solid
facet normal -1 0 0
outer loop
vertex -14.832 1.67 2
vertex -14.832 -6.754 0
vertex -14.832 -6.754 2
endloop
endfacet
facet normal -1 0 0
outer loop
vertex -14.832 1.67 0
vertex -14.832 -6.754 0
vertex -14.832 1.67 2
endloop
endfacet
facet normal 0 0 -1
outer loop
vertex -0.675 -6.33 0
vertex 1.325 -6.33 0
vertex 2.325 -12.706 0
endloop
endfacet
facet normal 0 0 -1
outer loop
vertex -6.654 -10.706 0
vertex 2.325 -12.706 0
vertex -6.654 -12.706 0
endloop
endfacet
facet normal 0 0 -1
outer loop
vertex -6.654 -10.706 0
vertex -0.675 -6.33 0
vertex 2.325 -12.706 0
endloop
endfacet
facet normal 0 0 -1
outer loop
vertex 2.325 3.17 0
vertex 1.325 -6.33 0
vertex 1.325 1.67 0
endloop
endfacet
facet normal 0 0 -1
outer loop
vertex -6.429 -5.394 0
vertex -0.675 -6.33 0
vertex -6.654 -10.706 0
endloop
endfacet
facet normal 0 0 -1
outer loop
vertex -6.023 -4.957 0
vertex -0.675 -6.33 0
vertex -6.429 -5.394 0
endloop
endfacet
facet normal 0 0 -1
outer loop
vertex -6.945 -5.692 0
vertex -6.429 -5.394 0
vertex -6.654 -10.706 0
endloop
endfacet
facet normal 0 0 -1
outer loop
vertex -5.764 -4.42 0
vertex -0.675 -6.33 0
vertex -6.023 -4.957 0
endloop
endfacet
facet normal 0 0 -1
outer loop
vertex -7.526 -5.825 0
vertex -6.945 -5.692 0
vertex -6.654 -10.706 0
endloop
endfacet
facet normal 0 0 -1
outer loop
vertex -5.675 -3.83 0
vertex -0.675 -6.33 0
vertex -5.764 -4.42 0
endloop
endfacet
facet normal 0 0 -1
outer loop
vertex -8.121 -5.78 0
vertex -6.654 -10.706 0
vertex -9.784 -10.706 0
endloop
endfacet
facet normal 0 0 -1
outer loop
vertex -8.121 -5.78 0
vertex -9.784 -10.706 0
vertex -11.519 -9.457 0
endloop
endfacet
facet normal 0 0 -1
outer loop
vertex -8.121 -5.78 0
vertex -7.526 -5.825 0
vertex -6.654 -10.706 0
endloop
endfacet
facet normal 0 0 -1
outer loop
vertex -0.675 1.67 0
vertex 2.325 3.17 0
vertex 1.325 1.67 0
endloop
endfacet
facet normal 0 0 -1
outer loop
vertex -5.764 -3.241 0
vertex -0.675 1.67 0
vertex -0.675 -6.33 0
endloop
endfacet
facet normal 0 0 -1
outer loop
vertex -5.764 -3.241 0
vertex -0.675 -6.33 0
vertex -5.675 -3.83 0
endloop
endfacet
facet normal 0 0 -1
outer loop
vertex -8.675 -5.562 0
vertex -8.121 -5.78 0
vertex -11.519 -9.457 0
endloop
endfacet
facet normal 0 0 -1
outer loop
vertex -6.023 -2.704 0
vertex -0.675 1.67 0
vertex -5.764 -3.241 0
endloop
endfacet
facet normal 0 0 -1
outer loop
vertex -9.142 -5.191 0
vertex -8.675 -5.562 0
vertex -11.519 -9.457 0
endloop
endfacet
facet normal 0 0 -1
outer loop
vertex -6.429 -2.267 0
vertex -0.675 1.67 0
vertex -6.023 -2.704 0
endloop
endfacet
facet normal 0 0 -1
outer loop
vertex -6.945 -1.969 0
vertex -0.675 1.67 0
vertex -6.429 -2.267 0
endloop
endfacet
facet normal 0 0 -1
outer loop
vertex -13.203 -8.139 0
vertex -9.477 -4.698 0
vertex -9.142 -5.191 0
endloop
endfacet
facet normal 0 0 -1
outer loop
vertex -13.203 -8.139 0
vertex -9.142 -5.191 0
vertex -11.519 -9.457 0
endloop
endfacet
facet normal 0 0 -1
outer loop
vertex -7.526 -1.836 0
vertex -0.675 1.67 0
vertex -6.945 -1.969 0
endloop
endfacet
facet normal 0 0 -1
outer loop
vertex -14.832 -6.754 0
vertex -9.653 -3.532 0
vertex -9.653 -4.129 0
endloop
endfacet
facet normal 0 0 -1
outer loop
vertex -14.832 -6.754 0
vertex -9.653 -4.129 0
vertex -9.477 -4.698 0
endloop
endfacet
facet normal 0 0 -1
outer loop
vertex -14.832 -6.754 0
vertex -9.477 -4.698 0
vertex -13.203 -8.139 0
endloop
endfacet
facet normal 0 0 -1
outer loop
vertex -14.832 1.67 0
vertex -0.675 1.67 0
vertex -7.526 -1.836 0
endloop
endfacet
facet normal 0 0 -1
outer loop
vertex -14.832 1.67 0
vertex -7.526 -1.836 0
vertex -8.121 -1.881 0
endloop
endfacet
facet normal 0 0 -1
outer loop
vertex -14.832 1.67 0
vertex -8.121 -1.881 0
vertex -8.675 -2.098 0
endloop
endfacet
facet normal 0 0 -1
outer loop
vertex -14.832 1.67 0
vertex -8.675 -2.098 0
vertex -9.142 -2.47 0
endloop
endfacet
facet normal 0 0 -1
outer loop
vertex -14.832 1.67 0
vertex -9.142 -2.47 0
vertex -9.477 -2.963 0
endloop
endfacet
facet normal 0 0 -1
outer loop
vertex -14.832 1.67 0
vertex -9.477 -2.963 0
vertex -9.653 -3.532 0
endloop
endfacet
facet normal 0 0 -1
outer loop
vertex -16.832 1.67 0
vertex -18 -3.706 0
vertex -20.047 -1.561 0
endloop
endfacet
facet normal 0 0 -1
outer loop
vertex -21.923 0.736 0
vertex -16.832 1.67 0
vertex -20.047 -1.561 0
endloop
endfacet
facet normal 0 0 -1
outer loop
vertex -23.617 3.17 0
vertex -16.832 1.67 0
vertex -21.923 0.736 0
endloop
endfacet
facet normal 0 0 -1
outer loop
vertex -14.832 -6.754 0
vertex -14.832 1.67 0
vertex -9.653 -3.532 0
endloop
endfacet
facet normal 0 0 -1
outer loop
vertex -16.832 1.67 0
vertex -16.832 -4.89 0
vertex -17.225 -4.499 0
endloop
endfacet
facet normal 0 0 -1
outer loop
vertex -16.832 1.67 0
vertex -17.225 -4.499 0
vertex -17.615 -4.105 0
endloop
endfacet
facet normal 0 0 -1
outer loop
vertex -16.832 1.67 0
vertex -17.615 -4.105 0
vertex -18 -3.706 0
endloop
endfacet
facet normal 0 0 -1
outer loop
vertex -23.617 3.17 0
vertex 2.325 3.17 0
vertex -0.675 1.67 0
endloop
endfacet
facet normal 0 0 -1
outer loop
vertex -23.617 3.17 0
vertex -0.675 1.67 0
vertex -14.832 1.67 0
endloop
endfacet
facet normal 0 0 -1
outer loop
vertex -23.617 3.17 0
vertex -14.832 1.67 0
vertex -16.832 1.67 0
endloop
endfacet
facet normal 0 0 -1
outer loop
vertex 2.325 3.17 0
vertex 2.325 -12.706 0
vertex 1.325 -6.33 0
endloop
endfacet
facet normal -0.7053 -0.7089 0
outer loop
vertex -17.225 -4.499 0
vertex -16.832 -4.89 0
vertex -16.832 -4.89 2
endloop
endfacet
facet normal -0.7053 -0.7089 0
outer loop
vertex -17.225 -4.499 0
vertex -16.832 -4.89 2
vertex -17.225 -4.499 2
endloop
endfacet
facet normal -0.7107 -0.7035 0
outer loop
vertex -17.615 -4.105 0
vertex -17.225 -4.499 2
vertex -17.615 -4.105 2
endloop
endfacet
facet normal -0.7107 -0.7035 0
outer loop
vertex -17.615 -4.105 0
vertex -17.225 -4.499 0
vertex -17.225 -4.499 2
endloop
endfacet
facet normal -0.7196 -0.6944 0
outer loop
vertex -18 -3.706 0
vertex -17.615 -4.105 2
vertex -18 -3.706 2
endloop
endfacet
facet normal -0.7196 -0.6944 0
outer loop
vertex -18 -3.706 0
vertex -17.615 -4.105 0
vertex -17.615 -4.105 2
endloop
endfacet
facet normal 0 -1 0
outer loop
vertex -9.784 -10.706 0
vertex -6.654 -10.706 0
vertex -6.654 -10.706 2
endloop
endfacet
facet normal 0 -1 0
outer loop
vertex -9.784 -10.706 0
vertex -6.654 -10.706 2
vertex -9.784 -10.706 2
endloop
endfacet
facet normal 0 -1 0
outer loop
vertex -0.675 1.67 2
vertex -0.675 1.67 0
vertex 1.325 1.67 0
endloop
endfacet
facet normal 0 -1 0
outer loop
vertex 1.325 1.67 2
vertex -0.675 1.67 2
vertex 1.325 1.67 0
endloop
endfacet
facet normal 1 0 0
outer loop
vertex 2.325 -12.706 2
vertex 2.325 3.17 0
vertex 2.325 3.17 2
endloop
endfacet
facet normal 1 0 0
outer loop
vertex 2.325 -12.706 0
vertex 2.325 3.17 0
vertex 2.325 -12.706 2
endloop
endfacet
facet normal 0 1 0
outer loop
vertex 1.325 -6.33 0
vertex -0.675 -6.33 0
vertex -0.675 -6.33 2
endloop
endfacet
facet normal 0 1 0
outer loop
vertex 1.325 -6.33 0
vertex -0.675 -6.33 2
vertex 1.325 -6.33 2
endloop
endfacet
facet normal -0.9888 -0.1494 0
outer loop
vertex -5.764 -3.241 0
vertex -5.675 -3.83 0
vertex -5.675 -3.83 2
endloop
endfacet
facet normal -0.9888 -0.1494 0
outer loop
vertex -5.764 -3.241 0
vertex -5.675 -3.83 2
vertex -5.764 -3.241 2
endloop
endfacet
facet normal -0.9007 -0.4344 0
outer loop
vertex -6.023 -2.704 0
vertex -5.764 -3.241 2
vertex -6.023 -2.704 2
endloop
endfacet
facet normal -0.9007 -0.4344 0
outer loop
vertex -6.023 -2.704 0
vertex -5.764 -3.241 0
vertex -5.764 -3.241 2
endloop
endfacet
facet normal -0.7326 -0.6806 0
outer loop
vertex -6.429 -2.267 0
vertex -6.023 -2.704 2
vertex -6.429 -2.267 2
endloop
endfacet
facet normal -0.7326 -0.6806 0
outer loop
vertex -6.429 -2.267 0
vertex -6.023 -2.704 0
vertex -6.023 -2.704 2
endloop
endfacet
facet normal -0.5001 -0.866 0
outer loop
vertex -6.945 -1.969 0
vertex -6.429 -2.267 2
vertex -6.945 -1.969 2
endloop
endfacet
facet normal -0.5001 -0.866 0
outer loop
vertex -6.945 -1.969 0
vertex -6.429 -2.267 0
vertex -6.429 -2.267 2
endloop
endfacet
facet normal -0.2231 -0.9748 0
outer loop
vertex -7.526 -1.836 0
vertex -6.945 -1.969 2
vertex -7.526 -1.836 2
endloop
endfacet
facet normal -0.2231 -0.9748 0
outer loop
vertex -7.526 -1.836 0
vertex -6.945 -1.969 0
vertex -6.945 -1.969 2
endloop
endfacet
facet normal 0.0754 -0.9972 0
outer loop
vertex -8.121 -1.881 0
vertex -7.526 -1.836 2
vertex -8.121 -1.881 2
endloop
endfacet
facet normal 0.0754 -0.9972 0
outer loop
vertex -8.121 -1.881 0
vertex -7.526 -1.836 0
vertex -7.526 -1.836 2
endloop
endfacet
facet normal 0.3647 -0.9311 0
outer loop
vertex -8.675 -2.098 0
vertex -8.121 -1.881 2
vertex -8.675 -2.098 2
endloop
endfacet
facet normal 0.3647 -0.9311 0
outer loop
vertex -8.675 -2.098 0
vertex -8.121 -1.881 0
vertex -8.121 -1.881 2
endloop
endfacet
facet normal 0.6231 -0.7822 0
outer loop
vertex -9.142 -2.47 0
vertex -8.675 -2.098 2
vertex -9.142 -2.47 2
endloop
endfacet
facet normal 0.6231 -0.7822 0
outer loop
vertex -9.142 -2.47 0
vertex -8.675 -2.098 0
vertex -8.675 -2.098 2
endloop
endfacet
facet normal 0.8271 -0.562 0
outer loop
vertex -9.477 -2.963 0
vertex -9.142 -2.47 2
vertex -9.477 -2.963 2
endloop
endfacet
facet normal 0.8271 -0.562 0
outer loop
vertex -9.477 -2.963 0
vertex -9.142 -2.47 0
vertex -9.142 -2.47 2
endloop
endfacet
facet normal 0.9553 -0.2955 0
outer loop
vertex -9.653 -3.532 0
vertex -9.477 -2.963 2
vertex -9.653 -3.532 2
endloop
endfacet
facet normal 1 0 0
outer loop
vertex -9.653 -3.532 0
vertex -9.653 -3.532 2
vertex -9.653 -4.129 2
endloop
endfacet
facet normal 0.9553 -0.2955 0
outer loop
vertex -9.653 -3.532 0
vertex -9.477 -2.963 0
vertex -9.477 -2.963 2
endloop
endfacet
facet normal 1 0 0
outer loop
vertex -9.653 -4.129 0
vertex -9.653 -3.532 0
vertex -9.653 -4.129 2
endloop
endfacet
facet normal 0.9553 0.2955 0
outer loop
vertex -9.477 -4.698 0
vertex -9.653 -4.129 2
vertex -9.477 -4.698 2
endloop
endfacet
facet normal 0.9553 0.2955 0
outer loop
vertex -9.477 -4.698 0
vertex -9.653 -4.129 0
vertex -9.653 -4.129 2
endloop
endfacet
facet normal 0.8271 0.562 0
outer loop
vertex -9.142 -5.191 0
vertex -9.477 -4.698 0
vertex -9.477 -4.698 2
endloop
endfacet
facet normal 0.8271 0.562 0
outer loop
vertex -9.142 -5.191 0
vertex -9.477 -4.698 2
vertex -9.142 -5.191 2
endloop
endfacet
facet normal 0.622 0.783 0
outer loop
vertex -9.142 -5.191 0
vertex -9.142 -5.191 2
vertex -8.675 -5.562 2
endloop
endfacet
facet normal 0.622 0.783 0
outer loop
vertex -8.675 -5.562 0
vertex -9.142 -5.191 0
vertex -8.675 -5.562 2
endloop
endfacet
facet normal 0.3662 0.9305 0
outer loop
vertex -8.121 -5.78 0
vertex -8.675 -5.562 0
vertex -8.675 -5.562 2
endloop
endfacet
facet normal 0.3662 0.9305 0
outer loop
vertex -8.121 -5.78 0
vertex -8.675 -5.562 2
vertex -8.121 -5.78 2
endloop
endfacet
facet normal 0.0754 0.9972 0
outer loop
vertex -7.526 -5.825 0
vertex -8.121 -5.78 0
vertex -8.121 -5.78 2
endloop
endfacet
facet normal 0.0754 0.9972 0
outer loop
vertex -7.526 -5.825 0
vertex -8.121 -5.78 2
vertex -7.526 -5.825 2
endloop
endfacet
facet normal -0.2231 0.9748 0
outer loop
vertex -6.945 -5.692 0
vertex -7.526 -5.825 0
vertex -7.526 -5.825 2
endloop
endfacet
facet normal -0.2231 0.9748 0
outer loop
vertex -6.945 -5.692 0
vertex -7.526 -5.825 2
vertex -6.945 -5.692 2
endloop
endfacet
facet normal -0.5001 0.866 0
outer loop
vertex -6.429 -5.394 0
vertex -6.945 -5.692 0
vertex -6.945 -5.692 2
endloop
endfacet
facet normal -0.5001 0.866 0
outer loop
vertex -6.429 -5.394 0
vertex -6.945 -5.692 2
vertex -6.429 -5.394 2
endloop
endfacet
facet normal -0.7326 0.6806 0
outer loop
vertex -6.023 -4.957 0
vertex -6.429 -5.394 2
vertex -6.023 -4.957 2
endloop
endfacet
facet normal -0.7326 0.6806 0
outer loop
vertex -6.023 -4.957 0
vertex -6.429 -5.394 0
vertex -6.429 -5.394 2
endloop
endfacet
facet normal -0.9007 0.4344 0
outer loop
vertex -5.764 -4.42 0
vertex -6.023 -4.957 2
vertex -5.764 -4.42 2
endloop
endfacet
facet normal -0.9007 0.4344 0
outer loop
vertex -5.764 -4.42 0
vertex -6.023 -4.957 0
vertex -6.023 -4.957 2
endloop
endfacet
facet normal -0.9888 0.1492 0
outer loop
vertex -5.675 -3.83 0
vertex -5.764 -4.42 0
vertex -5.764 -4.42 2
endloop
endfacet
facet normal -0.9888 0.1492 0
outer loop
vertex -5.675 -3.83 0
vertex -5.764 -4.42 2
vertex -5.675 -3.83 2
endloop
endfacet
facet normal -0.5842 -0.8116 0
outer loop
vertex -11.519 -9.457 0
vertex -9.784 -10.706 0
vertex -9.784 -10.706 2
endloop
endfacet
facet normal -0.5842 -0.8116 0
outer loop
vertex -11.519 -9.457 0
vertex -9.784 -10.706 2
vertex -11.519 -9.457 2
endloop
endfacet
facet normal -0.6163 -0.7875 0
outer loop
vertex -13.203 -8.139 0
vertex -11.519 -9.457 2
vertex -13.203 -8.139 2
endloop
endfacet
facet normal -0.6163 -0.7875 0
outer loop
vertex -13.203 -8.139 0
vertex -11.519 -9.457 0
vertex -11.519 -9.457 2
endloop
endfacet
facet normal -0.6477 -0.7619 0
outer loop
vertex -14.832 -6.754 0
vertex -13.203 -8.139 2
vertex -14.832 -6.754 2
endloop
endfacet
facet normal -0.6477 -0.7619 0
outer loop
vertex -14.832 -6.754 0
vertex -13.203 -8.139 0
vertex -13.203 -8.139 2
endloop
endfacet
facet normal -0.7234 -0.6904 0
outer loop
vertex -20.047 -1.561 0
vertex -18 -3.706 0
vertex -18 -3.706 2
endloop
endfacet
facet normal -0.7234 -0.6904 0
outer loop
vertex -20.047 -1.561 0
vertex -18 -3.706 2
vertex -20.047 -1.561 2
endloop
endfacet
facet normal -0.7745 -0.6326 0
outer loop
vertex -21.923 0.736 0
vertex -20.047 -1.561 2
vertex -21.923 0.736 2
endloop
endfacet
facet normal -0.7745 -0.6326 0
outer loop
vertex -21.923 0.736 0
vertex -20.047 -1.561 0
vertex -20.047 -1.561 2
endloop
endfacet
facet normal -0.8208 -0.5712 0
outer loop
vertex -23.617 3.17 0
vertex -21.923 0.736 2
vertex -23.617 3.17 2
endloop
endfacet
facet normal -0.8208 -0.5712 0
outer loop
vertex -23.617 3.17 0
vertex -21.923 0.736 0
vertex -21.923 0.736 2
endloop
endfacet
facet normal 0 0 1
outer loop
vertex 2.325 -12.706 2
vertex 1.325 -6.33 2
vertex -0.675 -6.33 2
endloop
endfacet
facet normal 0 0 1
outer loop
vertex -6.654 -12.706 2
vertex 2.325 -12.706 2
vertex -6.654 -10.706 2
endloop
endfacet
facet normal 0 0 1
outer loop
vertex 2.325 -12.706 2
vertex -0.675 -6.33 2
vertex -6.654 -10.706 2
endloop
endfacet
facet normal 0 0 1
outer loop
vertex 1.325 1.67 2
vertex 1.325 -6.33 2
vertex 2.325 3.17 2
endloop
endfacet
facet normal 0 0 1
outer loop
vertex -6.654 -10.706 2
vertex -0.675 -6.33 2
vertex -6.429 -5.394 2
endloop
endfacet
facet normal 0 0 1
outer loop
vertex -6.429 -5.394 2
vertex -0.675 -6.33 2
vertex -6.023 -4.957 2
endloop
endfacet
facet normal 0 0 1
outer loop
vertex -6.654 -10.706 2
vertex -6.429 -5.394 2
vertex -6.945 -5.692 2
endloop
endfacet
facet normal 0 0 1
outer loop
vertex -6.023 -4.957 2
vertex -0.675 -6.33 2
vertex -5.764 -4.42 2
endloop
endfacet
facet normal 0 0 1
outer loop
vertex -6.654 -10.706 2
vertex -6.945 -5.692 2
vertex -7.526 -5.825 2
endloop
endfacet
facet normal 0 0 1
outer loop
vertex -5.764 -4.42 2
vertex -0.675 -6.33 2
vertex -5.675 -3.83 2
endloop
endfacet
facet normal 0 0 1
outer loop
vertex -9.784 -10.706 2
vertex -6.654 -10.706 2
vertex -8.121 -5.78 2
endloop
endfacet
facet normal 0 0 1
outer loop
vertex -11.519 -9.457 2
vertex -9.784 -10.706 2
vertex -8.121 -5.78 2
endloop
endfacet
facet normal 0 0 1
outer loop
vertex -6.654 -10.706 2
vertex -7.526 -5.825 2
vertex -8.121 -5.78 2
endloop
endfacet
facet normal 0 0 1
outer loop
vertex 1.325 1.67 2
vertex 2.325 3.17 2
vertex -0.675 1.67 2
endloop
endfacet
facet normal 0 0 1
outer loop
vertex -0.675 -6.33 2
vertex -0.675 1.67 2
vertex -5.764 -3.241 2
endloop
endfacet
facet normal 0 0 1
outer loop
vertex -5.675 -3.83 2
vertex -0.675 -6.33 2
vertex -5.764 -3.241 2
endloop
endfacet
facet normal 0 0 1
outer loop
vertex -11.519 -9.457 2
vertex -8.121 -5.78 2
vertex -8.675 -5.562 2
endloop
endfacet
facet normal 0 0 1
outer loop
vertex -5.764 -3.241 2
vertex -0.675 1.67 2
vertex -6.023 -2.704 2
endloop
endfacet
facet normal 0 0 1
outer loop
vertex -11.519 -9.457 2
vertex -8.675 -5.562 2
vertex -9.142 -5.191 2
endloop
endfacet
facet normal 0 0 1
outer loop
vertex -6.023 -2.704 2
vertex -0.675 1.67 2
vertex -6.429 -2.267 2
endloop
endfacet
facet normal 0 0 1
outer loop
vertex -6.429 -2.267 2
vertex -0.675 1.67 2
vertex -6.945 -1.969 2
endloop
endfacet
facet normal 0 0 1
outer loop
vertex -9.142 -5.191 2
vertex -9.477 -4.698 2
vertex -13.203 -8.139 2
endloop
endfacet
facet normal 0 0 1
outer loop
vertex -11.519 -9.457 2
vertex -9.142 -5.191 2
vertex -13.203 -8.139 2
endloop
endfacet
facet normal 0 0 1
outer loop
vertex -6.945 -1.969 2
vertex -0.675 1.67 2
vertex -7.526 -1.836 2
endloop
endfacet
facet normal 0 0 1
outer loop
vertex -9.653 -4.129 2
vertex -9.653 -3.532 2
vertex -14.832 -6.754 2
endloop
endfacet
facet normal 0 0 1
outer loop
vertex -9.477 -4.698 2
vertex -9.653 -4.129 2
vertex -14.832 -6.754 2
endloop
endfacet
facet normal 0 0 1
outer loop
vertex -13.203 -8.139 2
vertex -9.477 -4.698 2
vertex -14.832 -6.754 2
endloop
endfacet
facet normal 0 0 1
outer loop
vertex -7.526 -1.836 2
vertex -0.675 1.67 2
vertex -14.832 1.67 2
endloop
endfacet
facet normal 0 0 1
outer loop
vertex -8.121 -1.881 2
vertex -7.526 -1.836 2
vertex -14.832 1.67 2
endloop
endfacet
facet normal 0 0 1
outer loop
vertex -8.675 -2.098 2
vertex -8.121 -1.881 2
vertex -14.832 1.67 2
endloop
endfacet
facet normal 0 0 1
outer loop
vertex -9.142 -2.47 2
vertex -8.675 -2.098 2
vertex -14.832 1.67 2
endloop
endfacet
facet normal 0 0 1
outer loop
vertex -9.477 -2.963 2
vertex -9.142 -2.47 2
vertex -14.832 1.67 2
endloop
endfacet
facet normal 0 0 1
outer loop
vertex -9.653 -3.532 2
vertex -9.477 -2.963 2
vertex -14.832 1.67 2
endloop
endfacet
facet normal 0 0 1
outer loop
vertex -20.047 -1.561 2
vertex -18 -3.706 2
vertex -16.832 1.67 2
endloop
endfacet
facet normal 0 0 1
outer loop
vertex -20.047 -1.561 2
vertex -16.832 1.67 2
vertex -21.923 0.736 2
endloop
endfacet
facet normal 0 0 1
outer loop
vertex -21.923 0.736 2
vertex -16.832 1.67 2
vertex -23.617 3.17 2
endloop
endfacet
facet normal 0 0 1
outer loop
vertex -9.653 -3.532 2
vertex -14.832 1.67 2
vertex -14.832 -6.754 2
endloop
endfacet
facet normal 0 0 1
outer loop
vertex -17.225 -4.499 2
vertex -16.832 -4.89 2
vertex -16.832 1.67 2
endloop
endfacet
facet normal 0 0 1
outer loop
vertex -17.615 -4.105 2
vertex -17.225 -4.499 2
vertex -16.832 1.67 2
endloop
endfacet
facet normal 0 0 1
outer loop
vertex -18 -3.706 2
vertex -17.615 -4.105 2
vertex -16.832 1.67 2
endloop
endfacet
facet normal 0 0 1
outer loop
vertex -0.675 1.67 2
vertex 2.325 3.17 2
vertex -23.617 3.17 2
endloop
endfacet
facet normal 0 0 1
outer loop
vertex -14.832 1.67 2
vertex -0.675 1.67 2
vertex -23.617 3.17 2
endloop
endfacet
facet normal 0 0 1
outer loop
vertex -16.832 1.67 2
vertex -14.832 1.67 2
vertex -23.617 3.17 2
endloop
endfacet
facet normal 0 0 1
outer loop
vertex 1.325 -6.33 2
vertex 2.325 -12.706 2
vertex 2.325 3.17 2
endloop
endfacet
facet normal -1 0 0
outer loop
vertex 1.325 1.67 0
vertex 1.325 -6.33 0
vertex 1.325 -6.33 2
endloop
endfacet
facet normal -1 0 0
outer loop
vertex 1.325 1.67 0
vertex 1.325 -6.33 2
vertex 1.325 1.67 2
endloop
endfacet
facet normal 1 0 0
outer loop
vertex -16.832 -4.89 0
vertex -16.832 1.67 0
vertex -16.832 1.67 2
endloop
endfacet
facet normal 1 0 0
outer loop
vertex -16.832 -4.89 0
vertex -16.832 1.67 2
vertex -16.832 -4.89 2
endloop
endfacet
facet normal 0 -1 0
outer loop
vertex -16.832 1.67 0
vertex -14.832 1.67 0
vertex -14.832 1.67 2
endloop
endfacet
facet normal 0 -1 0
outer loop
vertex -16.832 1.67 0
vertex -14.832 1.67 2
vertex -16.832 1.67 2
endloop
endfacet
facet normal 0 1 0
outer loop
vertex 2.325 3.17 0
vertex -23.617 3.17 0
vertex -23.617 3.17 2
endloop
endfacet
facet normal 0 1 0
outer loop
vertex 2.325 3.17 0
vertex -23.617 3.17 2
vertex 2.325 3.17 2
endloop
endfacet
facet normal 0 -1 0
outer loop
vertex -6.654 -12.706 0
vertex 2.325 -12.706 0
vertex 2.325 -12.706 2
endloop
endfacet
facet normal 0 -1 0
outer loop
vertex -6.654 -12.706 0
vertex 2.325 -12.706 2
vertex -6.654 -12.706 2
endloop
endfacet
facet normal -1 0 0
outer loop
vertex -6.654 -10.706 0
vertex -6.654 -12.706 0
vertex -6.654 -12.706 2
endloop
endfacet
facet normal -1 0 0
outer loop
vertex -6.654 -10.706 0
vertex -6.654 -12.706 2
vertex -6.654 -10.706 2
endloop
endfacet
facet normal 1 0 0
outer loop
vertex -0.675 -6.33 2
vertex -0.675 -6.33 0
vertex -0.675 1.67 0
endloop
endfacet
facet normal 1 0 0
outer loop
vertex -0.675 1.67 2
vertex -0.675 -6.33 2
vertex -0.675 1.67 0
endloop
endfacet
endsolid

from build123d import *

# Parameters (mm, degrees)
SKETCH1_R           = 2
SKETCH1_W           = 2
SKETCH1_H           = 8
BOSS_EXTRUDE1_DEPTH = 2


with BuildPart() as part:
    # Sketch1 → Boss-Extrude1 (new body)
    with BuildSketch(Plane.XY):
        with BuildLine():
            Line((-6.654132998, -12.706050279), (-6.654132998, -10.706050279))
            Line((-6.654132998, -10.706050279), (-9.783639909, -10.706050279))
            ThreePointArc((-9.783639909, -10.706050279), (-12.367491039, -8.806551261), (-14.831802528, -6.754344625))
            Line((-14.831802528, -6.754344625), (-14.831802528, 1.669576319))
            Line((-14.831802528, 1.669576319), (-16.831802528, 1.669576319))
            Line((-16.831802528, 1.669576319), (-16.831802528, -4.889537014))
            ThreePointArc((-16.831802528, -4.889537014), (-17.420540419, -4.302376557), (-18, -3.706057599))
            ThreePointArc((-18, -3.706057599), (-21.006837803, -0.430380182), (-23.616713146, 3.169576319))
            Line((-23.616713146, 3.169576319), (2.324507934, 3.169576319))
            Line((2.324507934, 3.169576319), (2.324507934, -12.706050279))
            Line((2.324507934, -12.706050279), (-6.654132998, -12.706050279))
        make_face()
        with Locations((-7.675492066, -3.830423681)):
            Circle(SKETCH1_R, mode=Mode.SUBTRACT)
        with Locations((0.324507934, -2.330423681)):
            Rectangle(SKETCH1_W, SKETCH1_H, mode=Mode.SUBTRACT)
    extrude(amount=BOSS_EXTRUDE1_DEPTH)


solid = part.part
